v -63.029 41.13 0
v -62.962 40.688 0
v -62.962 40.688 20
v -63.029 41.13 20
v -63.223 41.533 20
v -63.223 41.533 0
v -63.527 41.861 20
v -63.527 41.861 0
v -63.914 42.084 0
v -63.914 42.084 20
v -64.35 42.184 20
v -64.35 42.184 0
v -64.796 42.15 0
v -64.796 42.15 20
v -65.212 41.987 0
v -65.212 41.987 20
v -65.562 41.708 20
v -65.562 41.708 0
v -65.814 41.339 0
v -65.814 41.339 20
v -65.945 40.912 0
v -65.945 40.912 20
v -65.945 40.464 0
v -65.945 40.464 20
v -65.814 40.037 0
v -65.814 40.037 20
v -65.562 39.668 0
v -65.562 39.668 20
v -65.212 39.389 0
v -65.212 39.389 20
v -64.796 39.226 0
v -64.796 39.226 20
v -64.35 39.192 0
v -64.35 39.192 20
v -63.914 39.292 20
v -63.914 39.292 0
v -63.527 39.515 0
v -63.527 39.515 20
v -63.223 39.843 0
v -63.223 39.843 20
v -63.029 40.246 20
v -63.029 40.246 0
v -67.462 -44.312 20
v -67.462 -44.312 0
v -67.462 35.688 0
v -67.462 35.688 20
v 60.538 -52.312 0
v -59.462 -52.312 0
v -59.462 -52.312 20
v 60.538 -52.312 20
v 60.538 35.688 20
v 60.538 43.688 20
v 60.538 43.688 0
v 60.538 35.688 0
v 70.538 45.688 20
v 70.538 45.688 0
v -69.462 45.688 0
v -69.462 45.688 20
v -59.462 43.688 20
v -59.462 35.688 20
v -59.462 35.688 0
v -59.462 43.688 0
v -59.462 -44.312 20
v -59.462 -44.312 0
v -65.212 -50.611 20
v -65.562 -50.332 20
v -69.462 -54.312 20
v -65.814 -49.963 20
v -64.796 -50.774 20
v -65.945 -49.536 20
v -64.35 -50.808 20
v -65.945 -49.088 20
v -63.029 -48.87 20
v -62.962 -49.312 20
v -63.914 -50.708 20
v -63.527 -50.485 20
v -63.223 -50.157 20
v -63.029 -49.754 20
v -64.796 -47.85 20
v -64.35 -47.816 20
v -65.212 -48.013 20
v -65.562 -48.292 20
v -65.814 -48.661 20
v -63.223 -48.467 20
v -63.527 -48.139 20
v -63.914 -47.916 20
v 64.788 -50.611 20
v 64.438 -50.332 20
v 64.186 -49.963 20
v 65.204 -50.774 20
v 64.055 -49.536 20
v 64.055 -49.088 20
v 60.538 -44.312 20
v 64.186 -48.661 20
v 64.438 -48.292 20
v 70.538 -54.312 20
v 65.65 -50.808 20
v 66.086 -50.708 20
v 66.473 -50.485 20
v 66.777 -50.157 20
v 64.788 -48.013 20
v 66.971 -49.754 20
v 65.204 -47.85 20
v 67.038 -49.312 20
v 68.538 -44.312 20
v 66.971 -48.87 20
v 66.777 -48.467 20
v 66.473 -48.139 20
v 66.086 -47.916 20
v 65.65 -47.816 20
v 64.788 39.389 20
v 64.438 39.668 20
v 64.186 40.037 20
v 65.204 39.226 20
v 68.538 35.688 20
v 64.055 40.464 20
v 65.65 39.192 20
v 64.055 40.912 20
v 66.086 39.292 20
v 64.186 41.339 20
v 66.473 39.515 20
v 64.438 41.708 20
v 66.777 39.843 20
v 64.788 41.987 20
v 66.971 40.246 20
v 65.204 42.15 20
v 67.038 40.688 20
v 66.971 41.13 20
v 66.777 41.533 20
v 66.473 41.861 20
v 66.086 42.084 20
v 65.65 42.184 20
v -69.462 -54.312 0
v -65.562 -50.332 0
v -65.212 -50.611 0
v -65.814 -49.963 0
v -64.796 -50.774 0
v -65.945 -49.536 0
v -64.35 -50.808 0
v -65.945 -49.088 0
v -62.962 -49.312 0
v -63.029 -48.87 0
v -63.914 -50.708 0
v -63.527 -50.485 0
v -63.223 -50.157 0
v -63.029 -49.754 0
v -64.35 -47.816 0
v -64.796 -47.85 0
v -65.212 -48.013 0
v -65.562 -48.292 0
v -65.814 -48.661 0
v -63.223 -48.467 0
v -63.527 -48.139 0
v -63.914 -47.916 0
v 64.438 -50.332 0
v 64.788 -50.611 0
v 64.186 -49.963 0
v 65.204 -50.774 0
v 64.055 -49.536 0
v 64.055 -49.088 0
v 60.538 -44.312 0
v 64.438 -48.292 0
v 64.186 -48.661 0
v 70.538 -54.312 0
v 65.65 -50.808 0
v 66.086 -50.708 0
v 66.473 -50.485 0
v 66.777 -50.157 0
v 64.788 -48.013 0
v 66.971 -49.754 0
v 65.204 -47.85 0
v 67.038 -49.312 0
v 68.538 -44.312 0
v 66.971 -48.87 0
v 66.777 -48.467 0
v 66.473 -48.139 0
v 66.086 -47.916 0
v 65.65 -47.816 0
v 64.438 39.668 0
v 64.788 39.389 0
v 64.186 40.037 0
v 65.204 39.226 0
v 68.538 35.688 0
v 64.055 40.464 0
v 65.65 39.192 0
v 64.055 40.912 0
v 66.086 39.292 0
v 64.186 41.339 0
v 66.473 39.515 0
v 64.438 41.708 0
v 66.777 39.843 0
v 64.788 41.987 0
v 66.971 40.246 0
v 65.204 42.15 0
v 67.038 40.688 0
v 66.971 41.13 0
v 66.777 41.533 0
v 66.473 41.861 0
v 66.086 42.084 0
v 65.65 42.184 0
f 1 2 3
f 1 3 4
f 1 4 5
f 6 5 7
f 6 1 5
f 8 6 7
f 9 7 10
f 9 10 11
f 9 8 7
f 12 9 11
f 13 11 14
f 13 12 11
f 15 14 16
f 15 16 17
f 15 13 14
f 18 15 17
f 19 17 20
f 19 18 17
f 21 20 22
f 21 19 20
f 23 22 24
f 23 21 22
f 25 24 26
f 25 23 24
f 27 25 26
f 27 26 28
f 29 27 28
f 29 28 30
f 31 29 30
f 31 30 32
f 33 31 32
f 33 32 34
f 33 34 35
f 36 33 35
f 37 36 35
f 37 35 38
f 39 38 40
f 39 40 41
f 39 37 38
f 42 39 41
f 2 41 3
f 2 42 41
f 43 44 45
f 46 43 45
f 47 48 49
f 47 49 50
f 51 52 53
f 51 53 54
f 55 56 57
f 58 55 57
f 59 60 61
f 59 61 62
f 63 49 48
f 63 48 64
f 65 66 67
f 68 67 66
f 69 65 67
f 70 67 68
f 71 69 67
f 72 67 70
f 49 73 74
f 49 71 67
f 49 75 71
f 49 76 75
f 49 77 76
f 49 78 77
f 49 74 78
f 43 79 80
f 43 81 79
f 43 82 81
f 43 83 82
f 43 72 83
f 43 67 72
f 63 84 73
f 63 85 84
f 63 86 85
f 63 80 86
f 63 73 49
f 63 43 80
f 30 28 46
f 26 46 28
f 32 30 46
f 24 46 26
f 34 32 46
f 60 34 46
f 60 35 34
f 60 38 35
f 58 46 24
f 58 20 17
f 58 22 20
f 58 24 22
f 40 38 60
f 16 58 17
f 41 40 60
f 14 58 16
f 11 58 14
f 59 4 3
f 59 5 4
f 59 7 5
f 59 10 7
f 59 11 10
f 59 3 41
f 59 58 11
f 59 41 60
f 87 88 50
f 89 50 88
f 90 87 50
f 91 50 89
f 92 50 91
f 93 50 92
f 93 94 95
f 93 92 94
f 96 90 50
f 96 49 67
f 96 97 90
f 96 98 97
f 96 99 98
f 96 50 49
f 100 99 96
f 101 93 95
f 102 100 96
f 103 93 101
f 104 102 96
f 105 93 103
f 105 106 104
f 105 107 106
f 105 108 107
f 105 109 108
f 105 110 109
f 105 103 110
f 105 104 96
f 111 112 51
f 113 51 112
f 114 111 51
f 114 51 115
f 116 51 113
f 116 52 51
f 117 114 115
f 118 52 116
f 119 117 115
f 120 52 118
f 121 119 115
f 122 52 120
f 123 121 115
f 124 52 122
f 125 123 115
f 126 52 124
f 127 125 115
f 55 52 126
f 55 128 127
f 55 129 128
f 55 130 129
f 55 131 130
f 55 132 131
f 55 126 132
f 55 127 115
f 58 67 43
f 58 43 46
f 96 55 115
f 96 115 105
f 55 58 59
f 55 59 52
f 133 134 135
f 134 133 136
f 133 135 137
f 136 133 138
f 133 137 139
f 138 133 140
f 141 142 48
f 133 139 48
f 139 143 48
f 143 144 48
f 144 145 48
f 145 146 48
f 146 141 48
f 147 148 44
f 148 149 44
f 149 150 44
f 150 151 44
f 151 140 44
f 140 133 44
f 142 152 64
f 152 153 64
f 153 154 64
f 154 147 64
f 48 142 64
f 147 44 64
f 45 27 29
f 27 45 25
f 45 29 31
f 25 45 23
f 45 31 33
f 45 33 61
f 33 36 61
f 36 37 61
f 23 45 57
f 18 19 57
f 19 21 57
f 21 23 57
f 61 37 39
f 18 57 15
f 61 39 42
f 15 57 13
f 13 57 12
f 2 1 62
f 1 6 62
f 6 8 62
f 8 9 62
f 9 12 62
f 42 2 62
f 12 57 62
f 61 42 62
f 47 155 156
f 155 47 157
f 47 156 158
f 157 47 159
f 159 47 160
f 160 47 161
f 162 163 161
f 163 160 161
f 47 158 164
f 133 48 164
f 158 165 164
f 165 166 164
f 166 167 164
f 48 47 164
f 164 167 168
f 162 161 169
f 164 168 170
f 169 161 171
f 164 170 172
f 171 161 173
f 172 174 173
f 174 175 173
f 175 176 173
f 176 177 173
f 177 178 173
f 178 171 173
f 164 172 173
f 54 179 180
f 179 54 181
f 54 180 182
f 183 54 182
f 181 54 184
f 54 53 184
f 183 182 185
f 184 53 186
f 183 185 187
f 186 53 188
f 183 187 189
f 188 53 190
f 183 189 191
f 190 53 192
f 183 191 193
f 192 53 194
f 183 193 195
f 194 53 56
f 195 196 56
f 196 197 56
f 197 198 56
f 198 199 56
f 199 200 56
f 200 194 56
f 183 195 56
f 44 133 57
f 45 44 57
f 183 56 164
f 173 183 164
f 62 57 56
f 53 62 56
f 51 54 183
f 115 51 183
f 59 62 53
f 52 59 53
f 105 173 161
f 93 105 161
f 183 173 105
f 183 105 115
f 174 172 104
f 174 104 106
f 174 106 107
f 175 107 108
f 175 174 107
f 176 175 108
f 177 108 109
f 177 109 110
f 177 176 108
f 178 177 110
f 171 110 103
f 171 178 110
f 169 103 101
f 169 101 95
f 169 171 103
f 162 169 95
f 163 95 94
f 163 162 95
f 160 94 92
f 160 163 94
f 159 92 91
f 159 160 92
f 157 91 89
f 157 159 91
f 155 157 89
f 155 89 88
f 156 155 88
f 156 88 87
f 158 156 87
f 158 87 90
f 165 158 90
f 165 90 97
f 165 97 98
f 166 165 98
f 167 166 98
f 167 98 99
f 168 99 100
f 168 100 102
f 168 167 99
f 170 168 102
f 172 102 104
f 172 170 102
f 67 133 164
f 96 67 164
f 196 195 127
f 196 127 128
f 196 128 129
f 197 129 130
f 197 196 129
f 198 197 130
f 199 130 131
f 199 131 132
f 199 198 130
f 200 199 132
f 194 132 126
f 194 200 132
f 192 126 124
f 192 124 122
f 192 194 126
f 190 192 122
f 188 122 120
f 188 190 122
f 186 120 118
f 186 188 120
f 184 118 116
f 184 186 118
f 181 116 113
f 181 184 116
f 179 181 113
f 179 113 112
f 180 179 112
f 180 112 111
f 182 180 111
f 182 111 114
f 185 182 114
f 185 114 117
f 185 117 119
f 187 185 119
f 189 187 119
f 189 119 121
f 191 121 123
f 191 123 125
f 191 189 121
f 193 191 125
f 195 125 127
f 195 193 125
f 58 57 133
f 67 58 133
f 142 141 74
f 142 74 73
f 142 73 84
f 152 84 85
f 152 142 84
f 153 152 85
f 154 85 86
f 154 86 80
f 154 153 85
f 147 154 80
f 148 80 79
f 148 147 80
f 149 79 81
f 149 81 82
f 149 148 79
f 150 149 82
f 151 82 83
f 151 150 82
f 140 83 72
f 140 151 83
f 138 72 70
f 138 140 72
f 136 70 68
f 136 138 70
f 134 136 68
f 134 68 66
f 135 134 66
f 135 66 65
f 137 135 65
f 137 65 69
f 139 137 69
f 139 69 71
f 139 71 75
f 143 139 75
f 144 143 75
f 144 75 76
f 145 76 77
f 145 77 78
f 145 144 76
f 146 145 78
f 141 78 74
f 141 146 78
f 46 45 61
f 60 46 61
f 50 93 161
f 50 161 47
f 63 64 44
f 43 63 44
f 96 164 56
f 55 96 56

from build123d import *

# Parameters (mm, degrees)
F0_W     = 2
F0_H     = 80
F0_R     = 1.5
F0_W_2   = 120
F0_H_2   = 2
F0_H_3   = 40
F1_DEPTH = 20


with BuildPart() as f1:
    # F0 (on Top) → F1 (new body)
    with BuildSketch(Plane.XY):
        with Locations((69.537793, -4.311995)):
            Rectangle(F0_W, F0_H)
        Polygon((70.537793, -54.311995), (70.537793, -44.311995), (68.537793, -44.311995), (60.537793, -44.311995), (60.537793, -52.311995), (60.537793, -54.311995), align=None)
        with Locations((65.537793, -49.311995)):
            Circle(F0_R, mode=Mode.SUBTRACT)
        with Locations((0.537793, -53.311995)):
            Rectangle(F0_W_2, F0_H_2)
        with Locations((-68.462207, -24.311995)):
            Rectangle(F0_W, F0_H_3)
        Polygon((-67.462207, -44.311995), (-69.462207, -44.311995), (-69.462207, -54.311995), (-59.462207, -54.311995), (-59.462207, -52.311995), (-59.462207, -44.311995), align=None)
        with Locations((-64.462207, -49.311995)):
            Circle(F0_R, mode=Mode.SUBTRACT)
        with Locations((-68.462207, 15.688005)):
            Rectangle(F0_W, F0_H_3)
        Polygon((-59.462207, 45.688005), (-69.462207, 45.688005), (-69.462207, 35.688005), (-67.462207, 35.688005), (-59.462207, 35.688005), (-59.462207, 43.688005), align=None)
        with Locations((-64.462207, 40.688005)):
            Circle(F0_R, mode=Mode.SUBTRACT)
        with Locations((0.537793, 44.688005)):
            Rectangle(F0_W_2, F0_H_2)
        Polygon((70.537793, 45.688005), (60.537793, 45.688005), (60.537793, 43.688005), (60.537793, 35.688005), (68.537793, 35.688005), (70.537793, 35.688005), align=None)
        with Locations((65.537793, 40.688005)):
            Circle(F0_R, mode=Mode.SUBTRACT)
    extrude(amount=F1_DEPTH)


solid = f1.part
